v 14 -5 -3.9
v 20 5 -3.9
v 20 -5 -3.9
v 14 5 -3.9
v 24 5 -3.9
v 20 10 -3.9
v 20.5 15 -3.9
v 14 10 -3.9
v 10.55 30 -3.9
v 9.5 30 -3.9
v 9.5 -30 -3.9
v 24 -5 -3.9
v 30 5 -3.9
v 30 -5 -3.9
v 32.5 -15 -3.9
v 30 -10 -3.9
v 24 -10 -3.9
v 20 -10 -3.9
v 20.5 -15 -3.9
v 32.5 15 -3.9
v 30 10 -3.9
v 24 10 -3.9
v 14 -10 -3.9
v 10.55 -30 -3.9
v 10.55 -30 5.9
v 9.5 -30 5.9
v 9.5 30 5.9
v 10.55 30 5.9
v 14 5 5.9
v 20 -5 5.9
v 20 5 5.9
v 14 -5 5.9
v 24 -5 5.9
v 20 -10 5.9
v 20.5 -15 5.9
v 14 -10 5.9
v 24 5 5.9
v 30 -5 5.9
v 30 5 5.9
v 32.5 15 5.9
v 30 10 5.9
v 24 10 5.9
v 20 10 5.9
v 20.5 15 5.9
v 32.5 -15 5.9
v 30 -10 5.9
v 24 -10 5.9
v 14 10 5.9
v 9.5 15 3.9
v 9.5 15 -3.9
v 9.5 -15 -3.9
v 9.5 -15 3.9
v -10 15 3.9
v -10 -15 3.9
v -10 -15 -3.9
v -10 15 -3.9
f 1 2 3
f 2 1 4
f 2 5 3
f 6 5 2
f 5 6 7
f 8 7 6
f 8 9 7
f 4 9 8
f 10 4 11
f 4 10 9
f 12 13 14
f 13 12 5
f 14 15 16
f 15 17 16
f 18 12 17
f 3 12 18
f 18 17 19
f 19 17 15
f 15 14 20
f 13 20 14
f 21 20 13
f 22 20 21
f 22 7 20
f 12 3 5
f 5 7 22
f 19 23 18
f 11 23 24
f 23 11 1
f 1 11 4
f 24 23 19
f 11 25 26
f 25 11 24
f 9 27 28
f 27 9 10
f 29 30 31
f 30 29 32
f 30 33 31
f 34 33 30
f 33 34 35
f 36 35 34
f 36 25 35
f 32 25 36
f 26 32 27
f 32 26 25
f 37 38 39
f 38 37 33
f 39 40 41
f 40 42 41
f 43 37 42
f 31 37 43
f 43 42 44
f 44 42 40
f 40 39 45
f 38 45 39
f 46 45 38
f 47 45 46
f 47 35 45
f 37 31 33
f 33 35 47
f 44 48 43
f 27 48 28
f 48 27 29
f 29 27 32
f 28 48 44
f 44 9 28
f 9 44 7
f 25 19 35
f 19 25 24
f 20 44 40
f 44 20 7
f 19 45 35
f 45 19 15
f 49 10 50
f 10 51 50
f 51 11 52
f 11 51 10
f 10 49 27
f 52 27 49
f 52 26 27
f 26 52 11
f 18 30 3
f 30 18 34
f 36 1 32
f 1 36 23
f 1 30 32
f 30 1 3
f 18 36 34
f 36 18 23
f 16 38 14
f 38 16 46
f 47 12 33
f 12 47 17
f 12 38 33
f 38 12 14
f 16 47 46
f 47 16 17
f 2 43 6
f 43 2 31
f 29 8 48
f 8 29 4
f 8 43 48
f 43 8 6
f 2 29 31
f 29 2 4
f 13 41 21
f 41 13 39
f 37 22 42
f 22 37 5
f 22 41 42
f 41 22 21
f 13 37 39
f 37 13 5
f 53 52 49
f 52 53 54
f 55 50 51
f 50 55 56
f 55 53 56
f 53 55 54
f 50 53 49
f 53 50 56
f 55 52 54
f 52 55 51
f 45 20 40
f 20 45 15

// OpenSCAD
include <../../lib/relativity.scad> // https://github.com/davidson16807/relativity.scad

module body() {
  width=30;
  height=7.8;
  differed("hole", "body,guard")
    box([20, width, height])
    align(bottom+x) {
      box([1, $parent_size.y+30, $parent_size.z+2], anchor=bottom, $class="guard")
      align(bottom+x)
      hulled(class="guard")
      box([0.1, $parent_size.y, $parent_size.z], anchor=bottom, $class="guard")
      align(bottom)
      box([10, width, $parent_size.z], anchor=bottom-x)
      align(bottom+x)
      box([73, width, $parent_size.z], anchor=bottom-x, $class="body")
      ;
      translated(y*7.5, [-1,1])
      translated(x*10, [1:8])
      colored("red")
      box([6, 5, height+10], anchor=bottom+x, $class="hole")
      ;
    }

}

intersected("cut", "not(cut)") {
  box([65, 100, 50], $class="cut");
  body();
}
